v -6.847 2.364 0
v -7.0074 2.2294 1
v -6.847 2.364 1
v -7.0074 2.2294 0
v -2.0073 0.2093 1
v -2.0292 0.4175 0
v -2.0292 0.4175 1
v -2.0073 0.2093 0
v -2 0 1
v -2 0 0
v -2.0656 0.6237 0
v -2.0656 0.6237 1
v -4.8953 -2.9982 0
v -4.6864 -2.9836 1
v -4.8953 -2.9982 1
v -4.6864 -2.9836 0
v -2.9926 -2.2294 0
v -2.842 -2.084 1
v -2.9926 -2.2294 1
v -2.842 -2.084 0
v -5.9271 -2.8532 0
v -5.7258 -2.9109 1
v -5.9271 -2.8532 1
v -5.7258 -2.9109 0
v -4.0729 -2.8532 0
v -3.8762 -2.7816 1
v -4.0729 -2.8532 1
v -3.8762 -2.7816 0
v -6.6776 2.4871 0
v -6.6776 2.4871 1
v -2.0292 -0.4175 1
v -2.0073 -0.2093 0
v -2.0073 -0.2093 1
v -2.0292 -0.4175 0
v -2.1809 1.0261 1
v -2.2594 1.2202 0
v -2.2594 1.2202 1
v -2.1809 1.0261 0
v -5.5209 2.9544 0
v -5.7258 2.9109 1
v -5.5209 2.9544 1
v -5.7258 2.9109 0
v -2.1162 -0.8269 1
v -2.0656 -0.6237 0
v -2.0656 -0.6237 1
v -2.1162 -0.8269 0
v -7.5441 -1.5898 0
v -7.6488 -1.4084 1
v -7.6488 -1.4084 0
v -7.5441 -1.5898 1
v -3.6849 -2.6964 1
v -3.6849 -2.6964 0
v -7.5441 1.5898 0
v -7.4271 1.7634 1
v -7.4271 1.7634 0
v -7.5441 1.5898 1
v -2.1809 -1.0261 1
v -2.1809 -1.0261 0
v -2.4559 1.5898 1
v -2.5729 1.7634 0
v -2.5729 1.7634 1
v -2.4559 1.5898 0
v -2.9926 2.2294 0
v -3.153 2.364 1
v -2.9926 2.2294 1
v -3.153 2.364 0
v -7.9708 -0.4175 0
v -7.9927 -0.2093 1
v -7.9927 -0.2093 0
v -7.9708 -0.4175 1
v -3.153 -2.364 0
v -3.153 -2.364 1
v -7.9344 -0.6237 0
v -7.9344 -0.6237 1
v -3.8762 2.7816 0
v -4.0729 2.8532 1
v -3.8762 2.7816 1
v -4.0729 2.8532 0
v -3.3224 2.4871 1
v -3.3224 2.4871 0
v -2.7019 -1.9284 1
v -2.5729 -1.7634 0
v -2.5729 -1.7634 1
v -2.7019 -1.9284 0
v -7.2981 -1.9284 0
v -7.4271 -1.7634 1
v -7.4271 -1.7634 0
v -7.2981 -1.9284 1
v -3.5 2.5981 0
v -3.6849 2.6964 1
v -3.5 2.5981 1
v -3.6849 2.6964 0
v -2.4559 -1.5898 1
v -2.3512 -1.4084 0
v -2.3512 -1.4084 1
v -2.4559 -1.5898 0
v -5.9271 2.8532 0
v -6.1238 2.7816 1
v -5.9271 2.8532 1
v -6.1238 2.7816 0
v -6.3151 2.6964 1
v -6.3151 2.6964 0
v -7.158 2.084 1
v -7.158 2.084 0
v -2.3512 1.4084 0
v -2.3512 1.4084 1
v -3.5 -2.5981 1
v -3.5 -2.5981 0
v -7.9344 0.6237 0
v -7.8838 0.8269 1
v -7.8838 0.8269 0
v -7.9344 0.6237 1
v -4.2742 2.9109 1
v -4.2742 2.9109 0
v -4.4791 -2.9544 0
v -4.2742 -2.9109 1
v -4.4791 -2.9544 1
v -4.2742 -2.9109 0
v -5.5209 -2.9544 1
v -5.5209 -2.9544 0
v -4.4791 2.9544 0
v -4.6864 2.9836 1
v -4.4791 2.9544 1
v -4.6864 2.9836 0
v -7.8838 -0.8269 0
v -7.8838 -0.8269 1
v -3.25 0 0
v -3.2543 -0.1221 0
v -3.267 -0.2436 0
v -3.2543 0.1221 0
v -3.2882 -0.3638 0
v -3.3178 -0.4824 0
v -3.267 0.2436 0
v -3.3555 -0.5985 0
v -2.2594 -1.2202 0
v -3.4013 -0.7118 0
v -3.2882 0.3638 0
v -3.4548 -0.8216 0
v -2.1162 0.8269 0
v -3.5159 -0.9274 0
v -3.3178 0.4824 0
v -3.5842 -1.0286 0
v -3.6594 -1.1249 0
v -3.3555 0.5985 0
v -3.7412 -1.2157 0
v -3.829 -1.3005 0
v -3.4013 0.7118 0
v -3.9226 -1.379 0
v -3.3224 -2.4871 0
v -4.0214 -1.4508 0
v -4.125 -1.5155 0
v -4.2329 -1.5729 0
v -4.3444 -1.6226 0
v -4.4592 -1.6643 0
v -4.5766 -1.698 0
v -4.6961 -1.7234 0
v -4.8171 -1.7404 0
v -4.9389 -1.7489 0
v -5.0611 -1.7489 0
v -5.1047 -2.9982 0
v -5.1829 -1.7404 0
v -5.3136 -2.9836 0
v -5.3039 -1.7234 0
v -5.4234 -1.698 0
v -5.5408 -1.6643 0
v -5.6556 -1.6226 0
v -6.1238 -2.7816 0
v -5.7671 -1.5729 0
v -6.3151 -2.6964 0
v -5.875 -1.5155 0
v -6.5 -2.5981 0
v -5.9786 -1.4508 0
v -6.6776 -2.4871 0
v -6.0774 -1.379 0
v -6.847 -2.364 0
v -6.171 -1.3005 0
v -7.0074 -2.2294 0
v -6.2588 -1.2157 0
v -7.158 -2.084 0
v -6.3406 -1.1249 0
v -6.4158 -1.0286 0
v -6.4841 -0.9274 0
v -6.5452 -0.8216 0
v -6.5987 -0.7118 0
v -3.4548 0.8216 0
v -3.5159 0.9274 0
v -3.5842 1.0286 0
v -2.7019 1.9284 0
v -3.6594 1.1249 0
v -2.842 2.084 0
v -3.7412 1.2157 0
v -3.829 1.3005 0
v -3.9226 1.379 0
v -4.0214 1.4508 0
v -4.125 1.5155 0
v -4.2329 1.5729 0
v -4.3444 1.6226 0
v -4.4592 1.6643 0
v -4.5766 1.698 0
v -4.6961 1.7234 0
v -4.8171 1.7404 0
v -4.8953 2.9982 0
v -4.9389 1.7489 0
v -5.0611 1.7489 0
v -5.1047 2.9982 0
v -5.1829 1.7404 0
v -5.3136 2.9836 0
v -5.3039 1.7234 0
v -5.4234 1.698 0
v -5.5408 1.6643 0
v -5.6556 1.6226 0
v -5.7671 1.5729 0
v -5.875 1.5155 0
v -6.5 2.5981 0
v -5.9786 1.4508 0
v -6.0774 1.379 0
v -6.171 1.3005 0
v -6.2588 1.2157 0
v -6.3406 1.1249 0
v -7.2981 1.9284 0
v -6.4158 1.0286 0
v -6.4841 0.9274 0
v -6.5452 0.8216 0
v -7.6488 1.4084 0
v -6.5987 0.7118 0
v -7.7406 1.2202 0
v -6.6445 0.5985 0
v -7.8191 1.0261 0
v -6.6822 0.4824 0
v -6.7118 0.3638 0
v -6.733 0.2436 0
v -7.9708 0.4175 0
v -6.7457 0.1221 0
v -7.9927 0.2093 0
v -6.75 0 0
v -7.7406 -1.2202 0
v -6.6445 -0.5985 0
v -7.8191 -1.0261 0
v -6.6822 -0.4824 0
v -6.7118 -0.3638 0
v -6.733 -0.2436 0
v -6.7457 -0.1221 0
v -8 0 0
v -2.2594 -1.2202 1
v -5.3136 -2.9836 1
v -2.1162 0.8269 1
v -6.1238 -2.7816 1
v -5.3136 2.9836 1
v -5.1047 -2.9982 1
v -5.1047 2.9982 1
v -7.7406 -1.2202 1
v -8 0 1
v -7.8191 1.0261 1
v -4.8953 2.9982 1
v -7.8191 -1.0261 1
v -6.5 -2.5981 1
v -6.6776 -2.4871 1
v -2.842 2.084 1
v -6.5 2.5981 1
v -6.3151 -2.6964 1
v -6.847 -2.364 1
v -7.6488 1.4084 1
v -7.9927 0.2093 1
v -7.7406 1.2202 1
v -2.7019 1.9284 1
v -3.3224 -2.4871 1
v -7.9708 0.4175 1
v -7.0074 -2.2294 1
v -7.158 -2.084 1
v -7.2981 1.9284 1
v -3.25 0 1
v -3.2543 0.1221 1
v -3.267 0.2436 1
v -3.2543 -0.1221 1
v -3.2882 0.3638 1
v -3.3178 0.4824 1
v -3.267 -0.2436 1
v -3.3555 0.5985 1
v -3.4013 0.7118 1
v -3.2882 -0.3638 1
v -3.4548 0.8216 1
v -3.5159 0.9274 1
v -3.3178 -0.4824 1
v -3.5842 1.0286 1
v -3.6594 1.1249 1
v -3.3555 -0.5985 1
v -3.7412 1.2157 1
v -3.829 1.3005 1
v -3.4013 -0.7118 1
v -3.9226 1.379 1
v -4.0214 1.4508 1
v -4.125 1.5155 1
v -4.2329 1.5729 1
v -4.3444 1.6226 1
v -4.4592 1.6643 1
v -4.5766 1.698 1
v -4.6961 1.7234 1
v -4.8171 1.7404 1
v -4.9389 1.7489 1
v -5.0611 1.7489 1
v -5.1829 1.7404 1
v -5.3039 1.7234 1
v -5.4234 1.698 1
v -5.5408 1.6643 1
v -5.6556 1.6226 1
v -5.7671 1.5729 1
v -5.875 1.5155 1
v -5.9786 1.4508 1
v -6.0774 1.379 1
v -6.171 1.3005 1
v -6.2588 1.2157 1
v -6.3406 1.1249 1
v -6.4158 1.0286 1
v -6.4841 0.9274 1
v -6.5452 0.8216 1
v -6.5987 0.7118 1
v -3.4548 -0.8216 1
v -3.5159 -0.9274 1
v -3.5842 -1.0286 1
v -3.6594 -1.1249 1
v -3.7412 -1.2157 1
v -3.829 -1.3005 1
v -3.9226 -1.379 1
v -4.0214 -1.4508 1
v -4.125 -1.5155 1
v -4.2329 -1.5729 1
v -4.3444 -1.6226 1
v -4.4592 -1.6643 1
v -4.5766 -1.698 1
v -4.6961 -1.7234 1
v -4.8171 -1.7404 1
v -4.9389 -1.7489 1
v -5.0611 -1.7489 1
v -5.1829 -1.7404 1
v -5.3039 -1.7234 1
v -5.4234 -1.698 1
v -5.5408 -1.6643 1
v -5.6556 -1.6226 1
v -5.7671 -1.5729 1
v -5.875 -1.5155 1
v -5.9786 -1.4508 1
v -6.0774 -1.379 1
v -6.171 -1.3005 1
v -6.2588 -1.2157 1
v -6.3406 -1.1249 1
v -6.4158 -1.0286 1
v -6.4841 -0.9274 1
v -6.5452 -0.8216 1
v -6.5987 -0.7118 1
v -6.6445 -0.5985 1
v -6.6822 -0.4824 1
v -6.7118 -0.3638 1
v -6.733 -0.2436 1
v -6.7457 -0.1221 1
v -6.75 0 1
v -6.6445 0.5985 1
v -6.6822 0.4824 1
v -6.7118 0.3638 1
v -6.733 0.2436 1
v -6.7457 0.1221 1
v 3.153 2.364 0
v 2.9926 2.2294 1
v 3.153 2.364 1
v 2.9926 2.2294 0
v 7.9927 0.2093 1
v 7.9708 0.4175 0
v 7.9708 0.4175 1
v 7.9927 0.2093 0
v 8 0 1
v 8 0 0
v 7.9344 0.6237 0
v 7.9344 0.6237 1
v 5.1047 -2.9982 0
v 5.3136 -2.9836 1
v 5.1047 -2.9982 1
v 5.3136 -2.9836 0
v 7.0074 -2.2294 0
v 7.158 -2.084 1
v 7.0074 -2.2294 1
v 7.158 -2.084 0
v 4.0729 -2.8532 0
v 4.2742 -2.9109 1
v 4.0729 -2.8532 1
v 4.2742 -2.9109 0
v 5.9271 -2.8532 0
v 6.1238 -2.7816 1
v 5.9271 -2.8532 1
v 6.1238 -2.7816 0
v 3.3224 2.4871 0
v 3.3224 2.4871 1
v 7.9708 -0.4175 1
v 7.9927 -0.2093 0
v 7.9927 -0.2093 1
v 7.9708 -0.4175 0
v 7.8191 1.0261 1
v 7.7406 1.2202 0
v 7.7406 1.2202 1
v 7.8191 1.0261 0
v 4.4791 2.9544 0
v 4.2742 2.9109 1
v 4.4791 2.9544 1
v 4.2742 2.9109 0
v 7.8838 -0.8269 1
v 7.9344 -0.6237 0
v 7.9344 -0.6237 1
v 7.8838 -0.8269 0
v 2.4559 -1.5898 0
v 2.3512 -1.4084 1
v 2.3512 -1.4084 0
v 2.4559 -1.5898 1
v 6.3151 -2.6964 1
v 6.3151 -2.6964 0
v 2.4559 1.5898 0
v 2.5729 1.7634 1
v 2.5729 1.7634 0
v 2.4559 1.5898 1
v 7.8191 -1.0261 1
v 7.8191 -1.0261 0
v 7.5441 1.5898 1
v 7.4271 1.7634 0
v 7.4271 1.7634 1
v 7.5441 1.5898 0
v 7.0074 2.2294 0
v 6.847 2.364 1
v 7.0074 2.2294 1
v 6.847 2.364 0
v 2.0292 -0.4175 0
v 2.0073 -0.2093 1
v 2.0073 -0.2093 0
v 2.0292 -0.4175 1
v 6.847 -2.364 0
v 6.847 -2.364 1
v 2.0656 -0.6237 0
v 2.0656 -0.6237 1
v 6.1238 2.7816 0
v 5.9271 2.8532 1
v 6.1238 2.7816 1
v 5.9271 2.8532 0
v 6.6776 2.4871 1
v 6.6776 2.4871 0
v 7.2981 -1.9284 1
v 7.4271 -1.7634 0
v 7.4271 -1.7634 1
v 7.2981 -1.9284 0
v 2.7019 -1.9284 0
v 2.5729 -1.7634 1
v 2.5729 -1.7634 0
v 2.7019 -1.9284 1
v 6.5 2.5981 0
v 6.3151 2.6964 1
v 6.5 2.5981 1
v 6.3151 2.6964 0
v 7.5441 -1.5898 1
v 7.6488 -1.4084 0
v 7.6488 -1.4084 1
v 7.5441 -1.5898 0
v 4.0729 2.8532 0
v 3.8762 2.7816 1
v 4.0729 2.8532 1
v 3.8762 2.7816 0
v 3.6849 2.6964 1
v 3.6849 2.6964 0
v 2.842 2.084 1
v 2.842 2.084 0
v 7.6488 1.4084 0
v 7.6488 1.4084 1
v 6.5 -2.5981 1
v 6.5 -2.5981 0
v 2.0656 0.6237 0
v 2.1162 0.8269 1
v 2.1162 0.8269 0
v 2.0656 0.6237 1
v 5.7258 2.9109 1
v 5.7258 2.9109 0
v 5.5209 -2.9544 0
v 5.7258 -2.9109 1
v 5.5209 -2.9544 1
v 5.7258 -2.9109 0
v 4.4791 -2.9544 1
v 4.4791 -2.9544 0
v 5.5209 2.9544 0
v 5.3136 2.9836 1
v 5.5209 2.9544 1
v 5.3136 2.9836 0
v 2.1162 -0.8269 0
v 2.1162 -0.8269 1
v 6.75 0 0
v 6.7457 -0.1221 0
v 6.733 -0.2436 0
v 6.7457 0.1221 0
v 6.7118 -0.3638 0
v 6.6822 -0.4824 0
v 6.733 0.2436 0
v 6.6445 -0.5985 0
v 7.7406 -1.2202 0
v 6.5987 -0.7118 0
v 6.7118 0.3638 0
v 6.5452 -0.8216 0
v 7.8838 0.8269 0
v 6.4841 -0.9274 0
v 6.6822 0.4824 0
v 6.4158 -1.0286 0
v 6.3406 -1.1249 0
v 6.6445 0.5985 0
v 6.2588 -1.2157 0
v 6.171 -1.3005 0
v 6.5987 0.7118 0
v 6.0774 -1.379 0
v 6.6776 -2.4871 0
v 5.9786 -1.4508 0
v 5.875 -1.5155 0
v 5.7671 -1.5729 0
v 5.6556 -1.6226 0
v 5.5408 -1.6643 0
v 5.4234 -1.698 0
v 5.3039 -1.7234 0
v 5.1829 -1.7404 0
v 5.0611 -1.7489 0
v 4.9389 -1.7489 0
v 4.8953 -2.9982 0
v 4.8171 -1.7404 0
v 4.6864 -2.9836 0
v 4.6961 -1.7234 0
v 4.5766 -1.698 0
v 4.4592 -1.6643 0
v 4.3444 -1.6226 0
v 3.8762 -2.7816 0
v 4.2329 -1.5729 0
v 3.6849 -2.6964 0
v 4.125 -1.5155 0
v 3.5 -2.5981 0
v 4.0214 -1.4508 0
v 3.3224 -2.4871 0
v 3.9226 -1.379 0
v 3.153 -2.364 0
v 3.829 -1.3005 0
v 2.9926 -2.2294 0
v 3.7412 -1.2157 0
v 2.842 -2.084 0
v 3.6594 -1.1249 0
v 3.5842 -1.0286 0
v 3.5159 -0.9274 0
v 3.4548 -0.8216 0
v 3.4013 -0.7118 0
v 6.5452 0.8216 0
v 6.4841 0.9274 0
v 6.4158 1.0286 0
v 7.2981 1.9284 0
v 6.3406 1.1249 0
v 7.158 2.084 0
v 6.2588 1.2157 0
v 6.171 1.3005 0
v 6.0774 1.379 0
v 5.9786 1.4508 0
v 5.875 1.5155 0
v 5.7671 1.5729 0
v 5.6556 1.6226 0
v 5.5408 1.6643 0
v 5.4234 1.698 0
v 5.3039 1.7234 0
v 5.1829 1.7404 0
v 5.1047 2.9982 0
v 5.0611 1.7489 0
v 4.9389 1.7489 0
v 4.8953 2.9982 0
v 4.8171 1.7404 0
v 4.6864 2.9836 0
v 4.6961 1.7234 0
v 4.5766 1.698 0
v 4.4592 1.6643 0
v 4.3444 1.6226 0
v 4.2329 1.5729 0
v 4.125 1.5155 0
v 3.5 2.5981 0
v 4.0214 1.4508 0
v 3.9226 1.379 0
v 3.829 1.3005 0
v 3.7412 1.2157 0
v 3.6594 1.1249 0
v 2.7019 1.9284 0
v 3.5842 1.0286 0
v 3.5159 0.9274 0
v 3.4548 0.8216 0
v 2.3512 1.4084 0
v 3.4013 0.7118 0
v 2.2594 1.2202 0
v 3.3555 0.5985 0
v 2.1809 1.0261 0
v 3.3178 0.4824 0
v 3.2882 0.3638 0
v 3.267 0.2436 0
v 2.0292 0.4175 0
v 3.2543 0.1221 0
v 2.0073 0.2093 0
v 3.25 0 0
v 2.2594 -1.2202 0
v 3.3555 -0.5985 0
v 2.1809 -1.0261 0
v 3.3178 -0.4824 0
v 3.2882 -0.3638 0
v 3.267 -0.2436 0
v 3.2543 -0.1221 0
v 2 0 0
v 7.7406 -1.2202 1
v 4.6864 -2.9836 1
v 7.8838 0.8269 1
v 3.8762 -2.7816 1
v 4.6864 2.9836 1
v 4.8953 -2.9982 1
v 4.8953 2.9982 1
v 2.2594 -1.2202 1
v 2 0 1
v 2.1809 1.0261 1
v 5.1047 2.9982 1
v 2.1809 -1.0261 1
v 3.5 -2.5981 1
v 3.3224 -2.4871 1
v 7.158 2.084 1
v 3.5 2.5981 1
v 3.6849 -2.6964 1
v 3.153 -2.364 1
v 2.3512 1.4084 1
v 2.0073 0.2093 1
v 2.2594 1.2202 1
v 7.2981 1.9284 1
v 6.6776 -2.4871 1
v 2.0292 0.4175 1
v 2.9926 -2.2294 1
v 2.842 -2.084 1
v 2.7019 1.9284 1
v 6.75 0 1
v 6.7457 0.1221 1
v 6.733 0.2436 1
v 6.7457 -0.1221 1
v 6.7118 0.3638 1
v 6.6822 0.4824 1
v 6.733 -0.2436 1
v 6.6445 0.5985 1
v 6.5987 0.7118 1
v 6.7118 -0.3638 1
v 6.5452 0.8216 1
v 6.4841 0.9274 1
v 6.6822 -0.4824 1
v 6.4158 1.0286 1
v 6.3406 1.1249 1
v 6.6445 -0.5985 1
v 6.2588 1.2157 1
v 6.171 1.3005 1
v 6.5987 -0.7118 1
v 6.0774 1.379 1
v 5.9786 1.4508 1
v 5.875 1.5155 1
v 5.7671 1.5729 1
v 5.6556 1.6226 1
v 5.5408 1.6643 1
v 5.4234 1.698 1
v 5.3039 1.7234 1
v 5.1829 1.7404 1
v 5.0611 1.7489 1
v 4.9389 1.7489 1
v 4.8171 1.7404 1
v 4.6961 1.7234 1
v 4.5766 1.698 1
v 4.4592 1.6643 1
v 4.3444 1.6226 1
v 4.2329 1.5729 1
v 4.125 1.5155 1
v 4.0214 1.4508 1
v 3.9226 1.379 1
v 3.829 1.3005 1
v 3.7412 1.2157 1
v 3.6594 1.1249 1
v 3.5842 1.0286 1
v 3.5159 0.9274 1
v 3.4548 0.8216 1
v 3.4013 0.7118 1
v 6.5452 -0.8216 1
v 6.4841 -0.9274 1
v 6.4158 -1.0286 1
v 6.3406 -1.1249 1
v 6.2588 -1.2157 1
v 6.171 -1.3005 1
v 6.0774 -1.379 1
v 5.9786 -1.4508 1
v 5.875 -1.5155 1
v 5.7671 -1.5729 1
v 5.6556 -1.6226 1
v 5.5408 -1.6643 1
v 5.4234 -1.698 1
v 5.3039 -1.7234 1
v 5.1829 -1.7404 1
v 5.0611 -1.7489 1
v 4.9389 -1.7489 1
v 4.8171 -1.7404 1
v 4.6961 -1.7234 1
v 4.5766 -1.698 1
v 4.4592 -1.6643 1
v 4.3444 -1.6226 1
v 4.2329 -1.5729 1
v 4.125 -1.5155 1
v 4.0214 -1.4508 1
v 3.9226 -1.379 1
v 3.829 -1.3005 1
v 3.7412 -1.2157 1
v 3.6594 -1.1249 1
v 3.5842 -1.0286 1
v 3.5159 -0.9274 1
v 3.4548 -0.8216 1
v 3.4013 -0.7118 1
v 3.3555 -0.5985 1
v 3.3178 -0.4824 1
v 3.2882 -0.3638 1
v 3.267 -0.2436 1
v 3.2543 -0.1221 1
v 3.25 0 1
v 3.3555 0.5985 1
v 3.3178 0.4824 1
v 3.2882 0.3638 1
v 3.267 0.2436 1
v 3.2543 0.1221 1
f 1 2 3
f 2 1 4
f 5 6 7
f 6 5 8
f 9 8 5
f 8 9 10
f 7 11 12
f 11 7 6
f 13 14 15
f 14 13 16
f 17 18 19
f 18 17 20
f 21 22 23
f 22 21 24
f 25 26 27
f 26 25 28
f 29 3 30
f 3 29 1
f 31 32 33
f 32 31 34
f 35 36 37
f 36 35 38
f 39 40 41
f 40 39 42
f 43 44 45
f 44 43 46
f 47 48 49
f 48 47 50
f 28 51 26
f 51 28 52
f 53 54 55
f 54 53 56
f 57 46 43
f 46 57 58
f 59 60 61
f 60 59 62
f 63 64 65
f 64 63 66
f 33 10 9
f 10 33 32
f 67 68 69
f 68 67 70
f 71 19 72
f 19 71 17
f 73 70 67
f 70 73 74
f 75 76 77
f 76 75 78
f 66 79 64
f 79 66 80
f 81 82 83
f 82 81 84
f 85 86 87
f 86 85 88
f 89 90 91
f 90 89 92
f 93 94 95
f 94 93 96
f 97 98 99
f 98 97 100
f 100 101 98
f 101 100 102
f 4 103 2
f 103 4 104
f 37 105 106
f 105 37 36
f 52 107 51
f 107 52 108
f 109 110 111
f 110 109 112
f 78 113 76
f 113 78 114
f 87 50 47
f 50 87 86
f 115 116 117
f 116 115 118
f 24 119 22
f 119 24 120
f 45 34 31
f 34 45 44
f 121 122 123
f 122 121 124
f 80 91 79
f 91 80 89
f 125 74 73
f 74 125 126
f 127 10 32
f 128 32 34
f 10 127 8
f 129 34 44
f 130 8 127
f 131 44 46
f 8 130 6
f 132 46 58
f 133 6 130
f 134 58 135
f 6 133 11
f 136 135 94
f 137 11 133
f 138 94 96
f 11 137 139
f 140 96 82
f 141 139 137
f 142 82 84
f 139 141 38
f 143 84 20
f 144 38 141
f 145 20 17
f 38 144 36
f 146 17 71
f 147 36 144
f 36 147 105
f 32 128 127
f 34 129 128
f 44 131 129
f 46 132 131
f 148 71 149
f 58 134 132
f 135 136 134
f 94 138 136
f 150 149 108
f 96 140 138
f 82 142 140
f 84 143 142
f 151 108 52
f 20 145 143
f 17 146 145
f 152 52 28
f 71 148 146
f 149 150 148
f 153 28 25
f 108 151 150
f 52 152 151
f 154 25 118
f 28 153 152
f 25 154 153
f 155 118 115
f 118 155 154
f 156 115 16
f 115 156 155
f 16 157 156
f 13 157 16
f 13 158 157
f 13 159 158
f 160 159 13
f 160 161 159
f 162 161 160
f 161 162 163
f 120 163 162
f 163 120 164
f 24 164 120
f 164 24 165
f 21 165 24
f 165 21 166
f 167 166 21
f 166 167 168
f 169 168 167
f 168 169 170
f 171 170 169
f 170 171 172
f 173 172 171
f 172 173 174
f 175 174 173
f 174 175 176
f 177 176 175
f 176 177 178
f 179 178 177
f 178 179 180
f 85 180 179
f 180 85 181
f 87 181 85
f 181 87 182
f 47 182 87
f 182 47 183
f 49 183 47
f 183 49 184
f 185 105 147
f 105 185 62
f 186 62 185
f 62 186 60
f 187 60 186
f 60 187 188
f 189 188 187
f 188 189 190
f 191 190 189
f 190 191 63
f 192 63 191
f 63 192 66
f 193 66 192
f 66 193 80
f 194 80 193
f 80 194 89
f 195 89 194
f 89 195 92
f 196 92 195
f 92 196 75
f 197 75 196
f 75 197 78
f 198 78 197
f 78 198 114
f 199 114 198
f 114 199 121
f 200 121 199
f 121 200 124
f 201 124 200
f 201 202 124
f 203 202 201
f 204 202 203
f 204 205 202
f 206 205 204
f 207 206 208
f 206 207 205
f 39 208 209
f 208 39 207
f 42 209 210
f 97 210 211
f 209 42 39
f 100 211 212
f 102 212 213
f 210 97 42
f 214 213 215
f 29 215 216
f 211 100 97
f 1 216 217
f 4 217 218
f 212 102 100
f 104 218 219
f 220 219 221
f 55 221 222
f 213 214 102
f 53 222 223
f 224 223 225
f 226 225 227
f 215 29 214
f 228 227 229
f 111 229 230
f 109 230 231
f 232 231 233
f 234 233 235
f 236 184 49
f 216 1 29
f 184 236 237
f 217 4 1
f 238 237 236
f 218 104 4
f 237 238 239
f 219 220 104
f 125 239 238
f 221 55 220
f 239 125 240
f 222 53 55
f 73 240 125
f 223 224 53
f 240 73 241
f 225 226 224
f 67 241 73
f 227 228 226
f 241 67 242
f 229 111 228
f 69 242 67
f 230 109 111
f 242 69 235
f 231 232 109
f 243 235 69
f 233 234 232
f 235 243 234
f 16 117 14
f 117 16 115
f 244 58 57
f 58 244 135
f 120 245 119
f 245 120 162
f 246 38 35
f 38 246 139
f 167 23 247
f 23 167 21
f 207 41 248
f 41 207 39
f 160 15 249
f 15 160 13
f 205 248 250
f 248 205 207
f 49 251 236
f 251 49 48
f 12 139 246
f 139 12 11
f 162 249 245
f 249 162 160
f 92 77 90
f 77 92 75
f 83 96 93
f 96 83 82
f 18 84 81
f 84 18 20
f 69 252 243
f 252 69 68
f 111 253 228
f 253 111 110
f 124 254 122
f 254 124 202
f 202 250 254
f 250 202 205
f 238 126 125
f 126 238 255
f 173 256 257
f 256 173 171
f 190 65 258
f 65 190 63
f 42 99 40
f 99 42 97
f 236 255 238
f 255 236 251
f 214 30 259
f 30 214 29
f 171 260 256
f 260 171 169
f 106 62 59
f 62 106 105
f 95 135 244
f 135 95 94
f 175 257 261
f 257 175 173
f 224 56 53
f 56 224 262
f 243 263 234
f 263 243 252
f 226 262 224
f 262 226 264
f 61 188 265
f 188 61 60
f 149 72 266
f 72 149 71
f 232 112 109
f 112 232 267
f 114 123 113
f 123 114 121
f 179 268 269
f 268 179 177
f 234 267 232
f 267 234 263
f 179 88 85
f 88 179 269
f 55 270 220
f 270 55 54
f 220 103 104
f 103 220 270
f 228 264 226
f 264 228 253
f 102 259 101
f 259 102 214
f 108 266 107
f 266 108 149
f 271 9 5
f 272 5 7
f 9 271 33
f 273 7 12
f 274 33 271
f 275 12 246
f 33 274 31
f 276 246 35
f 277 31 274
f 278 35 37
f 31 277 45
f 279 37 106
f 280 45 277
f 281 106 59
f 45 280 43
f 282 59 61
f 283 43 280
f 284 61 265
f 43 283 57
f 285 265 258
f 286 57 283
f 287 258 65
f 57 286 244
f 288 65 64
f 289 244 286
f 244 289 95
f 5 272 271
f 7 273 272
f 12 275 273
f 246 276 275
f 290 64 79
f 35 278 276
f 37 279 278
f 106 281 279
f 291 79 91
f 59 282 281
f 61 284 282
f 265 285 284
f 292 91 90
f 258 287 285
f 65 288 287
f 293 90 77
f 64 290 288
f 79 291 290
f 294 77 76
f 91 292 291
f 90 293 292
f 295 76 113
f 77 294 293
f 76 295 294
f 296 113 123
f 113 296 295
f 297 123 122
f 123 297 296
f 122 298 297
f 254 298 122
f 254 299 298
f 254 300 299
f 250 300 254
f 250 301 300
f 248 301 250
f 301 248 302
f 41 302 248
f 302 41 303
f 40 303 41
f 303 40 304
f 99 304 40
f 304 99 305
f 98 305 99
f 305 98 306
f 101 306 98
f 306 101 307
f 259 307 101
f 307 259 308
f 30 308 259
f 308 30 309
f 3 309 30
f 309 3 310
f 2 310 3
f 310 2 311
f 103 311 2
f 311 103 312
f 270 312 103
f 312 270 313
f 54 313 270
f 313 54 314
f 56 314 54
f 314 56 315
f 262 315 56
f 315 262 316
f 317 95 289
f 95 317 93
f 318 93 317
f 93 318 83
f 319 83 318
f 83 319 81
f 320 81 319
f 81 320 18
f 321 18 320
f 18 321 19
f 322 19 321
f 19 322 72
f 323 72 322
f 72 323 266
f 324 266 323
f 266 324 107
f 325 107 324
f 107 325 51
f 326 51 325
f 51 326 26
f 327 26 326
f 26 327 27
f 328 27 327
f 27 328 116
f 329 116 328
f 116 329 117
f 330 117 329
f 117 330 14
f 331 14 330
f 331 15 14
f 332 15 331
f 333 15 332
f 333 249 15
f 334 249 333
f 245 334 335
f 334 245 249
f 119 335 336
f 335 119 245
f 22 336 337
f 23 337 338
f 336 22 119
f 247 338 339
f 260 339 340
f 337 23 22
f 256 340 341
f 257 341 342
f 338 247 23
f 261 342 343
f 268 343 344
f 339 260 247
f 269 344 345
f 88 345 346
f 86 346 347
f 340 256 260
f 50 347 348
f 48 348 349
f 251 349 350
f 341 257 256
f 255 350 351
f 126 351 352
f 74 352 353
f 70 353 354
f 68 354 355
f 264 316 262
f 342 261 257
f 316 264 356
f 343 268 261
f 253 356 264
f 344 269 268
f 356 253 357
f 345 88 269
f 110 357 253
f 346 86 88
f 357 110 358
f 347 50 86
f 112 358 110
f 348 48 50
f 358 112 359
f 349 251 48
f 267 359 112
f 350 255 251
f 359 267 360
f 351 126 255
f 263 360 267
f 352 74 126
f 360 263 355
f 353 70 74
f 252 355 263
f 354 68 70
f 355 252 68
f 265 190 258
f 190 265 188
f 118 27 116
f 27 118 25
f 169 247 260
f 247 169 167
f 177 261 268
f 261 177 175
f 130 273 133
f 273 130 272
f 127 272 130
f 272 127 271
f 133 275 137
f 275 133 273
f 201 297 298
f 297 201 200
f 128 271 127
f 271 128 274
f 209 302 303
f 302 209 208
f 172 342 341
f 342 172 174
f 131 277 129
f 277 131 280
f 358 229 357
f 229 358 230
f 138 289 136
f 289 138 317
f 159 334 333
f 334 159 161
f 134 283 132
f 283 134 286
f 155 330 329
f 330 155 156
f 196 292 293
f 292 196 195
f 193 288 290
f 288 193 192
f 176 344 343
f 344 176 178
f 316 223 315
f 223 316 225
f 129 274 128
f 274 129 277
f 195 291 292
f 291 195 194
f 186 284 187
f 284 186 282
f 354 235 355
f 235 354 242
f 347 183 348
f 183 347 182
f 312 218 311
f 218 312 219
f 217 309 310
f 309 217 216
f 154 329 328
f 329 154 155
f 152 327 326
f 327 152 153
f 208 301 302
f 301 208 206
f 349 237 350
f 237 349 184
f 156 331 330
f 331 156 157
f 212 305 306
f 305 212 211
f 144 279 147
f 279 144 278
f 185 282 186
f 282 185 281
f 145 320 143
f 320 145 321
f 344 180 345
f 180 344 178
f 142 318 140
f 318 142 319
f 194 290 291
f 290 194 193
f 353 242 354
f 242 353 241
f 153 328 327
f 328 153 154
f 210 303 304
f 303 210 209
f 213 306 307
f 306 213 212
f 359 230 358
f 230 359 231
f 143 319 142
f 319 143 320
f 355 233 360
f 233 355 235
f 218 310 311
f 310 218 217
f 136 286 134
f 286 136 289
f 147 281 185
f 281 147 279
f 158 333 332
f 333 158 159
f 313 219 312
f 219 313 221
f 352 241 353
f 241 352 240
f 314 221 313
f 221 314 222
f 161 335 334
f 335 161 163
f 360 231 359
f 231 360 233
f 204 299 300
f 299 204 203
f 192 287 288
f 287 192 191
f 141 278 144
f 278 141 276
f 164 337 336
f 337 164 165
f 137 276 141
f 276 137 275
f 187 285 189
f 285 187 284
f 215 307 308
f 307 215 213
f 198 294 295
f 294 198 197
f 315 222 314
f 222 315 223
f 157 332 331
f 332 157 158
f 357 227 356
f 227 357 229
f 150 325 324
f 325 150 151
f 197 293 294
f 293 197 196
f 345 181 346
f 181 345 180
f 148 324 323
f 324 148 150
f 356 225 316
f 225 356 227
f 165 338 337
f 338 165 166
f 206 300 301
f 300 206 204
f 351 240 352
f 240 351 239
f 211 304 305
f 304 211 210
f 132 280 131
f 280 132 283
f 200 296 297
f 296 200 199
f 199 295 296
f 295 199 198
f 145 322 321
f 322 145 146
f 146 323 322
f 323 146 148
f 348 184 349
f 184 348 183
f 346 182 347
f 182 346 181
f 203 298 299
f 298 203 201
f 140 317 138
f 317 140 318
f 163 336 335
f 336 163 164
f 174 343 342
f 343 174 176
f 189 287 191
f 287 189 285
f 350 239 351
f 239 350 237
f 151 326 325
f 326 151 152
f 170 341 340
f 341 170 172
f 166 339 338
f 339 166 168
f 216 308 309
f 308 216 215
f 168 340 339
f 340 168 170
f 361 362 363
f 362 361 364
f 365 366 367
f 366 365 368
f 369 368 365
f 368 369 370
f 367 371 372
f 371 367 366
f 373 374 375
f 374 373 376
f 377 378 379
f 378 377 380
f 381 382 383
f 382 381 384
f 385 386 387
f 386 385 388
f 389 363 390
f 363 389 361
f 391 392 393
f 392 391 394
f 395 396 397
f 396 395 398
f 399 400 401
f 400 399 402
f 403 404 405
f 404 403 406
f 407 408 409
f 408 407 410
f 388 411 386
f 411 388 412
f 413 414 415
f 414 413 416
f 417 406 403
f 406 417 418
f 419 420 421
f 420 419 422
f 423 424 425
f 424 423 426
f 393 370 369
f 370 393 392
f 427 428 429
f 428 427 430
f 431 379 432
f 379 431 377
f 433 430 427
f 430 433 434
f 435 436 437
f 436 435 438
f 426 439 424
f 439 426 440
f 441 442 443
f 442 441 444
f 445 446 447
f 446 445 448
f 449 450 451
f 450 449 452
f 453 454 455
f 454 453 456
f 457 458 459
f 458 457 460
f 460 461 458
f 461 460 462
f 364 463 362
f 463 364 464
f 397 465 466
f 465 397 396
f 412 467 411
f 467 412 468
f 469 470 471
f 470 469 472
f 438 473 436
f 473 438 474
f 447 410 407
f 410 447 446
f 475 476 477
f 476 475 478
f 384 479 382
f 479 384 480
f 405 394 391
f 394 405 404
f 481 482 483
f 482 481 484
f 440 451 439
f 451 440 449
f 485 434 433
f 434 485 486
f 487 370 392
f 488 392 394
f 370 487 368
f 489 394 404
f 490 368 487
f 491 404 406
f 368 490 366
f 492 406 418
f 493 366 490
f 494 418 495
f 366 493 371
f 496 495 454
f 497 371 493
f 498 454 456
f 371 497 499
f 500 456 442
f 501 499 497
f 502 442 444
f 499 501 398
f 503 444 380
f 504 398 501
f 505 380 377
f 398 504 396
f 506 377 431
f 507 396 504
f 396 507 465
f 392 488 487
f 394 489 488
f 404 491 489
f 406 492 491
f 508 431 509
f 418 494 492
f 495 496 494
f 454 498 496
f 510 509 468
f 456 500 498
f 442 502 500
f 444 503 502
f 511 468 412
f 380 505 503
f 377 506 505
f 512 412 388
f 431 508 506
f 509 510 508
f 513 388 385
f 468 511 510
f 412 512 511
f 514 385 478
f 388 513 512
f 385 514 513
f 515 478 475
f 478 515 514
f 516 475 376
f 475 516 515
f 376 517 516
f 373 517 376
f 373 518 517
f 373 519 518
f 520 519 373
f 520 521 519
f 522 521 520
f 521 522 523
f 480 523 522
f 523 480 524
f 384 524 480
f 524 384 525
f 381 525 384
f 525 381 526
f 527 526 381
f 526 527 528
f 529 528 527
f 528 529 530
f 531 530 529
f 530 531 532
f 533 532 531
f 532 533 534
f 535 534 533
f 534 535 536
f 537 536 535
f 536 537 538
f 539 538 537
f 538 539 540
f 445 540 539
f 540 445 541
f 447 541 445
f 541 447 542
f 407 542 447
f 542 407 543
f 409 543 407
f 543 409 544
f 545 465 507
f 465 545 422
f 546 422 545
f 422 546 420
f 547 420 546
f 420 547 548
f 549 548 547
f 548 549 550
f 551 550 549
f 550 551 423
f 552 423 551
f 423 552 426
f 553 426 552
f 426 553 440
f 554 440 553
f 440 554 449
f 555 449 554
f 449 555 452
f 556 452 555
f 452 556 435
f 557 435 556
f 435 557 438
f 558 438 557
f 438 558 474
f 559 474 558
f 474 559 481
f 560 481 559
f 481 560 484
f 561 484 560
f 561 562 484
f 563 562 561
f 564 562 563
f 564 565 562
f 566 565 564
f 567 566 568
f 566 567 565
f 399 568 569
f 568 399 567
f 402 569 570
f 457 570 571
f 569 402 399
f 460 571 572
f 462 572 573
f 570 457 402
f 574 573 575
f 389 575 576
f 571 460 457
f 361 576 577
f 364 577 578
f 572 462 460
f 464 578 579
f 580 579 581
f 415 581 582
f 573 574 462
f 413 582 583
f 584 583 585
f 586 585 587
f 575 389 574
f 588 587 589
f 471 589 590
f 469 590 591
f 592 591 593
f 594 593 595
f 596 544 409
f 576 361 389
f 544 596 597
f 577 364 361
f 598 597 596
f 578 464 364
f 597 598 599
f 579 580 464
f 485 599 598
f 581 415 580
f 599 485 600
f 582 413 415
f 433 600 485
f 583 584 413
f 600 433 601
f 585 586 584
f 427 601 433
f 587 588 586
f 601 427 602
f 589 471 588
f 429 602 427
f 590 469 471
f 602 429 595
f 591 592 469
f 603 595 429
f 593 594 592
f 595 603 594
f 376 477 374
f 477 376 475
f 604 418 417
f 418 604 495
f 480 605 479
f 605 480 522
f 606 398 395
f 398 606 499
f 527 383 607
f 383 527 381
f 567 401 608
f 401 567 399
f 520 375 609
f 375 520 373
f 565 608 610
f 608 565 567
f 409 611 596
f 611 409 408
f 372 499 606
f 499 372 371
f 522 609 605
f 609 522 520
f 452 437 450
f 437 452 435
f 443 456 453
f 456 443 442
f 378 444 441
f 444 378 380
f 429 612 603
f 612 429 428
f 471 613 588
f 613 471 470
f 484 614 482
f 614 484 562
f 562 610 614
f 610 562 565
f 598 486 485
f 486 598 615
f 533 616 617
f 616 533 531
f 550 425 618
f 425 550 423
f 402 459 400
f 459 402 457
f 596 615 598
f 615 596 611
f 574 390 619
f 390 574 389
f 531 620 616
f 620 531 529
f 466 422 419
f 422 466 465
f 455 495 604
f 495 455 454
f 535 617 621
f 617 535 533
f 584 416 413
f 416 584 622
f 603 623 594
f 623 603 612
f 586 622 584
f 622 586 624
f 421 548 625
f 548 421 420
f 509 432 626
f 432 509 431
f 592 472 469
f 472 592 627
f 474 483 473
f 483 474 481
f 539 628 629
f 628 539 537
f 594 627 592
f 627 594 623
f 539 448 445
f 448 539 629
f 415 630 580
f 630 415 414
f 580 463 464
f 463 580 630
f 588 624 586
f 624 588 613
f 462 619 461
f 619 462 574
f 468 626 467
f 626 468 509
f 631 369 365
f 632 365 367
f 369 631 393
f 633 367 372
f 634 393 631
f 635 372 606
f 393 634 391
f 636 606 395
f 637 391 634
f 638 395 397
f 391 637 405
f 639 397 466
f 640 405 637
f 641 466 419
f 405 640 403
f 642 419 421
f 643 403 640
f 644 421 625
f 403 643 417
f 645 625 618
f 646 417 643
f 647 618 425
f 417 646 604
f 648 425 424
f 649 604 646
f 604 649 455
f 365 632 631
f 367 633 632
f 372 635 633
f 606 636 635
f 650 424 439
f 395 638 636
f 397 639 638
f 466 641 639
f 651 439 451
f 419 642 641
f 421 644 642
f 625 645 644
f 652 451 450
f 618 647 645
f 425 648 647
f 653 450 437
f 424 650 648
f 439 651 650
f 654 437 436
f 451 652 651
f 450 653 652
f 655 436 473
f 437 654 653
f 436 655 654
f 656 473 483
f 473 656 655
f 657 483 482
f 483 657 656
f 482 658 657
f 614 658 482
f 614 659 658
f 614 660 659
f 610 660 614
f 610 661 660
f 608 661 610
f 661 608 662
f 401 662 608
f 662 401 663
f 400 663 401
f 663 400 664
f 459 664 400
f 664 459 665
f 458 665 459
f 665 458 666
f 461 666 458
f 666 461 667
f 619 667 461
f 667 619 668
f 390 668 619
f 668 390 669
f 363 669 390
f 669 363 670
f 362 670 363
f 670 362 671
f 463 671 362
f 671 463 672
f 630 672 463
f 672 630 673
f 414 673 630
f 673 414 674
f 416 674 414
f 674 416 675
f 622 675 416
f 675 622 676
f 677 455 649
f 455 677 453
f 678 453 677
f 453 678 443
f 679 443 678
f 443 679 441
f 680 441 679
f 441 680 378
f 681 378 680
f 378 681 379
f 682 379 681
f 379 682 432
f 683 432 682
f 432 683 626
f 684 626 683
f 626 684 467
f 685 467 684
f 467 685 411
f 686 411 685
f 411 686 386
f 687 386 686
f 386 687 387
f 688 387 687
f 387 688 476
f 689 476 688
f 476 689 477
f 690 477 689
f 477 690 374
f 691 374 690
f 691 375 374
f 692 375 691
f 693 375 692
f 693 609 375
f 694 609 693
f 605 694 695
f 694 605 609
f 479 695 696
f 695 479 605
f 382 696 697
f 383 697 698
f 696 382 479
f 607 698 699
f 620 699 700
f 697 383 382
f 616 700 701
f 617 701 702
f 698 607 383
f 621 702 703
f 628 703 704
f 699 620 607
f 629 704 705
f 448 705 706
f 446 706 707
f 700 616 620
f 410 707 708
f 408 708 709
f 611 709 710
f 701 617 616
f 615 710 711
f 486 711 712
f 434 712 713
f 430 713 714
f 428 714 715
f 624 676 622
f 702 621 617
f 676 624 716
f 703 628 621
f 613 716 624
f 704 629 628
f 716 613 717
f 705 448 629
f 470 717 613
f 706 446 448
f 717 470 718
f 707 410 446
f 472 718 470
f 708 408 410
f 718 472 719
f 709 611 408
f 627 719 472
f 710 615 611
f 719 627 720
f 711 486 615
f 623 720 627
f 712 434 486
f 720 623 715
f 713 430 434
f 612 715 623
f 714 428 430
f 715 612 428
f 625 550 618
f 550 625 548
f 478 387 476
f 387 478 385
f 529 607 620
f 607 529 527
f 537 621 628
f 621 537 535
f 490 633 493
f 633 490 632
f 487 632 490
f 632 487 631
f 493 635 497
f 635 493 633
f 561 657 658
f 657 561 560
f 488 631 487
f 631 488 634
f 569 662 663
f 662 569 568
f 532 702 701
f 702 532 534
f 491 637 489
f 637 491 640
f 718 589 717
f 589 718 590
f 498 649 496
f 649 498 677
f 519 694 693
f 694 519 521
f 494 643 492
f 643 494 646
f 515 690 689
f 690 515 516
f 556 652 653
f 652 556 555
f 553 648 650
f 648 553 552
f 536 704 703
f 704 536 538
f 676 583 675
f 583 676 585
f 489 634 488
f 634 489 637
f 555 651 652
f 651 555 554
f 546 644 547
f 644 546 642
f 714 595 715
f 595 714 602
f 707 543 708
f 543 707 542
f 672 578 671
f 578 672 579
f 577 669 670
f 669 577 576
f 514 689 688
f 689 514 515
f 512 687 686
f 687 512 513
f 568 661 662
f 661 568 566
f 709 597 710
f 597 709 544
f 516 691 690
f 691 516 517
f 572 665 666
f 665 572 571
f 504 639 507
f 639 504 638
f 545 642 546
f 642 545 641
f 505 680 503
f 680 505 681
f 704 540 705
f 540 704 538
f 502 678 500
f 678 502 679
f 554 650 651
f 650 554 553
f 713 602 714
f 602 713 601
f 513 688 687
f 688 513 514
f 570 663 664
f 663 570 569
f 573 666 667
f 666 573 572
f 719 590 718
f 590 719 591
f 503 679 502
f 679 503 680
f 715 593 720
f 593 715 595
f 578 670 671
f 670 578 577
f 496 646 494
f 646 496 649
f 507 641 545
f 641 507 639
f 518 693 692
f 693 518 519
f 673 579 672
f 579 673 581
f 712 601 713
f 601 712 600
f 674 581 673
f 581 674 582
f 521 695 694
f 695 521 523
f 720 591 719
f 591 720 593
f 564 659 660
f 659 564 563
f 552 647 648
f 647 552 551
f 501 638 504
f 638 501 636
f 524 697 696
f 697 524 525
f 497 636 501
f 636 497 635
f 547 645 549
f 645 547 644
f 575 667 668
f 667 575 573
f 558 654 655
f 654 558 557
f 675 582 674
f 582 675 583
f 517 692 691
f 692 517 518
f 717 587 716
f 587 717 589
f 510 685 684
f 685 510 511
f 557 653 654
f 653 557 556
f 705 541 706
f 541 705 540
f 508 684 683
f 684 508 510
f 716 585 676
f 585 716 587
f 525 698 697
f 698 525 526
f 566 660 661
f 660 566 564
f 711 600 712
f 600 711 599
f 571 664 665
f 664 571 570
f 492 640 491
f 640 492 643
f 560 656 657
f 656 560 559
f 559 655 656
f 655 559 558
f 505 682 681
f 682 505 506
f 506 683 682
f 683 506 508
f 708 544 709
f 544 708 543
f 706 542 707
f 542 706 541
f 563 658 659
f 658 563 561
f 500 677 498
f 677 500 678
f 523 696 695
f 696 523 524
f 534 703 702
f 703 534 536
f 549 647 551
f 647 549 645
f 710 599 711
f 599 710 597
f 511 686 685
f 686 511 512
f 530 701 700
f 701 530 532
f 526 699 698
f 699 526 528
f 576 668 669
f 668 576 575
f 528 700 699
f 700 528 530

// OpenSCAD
$fn = 90;
dxy = 6;
sp = 4;
eps = 0.001;
trim = 0.3;

module spacer()
{
    do = 6;
    di = 3.2 + trim;
    t = 1;
    difference()
    {
        cylinder(h=t, d=do, center=false);
        translate([0, 0, -eps]) cylinder(h=t+eps*2, d=di, center=false);
    }
}

for(x = [-0.5, 0.5])
{
    translate([x * (dxy + sp), 0, 0]) spacer();
}
